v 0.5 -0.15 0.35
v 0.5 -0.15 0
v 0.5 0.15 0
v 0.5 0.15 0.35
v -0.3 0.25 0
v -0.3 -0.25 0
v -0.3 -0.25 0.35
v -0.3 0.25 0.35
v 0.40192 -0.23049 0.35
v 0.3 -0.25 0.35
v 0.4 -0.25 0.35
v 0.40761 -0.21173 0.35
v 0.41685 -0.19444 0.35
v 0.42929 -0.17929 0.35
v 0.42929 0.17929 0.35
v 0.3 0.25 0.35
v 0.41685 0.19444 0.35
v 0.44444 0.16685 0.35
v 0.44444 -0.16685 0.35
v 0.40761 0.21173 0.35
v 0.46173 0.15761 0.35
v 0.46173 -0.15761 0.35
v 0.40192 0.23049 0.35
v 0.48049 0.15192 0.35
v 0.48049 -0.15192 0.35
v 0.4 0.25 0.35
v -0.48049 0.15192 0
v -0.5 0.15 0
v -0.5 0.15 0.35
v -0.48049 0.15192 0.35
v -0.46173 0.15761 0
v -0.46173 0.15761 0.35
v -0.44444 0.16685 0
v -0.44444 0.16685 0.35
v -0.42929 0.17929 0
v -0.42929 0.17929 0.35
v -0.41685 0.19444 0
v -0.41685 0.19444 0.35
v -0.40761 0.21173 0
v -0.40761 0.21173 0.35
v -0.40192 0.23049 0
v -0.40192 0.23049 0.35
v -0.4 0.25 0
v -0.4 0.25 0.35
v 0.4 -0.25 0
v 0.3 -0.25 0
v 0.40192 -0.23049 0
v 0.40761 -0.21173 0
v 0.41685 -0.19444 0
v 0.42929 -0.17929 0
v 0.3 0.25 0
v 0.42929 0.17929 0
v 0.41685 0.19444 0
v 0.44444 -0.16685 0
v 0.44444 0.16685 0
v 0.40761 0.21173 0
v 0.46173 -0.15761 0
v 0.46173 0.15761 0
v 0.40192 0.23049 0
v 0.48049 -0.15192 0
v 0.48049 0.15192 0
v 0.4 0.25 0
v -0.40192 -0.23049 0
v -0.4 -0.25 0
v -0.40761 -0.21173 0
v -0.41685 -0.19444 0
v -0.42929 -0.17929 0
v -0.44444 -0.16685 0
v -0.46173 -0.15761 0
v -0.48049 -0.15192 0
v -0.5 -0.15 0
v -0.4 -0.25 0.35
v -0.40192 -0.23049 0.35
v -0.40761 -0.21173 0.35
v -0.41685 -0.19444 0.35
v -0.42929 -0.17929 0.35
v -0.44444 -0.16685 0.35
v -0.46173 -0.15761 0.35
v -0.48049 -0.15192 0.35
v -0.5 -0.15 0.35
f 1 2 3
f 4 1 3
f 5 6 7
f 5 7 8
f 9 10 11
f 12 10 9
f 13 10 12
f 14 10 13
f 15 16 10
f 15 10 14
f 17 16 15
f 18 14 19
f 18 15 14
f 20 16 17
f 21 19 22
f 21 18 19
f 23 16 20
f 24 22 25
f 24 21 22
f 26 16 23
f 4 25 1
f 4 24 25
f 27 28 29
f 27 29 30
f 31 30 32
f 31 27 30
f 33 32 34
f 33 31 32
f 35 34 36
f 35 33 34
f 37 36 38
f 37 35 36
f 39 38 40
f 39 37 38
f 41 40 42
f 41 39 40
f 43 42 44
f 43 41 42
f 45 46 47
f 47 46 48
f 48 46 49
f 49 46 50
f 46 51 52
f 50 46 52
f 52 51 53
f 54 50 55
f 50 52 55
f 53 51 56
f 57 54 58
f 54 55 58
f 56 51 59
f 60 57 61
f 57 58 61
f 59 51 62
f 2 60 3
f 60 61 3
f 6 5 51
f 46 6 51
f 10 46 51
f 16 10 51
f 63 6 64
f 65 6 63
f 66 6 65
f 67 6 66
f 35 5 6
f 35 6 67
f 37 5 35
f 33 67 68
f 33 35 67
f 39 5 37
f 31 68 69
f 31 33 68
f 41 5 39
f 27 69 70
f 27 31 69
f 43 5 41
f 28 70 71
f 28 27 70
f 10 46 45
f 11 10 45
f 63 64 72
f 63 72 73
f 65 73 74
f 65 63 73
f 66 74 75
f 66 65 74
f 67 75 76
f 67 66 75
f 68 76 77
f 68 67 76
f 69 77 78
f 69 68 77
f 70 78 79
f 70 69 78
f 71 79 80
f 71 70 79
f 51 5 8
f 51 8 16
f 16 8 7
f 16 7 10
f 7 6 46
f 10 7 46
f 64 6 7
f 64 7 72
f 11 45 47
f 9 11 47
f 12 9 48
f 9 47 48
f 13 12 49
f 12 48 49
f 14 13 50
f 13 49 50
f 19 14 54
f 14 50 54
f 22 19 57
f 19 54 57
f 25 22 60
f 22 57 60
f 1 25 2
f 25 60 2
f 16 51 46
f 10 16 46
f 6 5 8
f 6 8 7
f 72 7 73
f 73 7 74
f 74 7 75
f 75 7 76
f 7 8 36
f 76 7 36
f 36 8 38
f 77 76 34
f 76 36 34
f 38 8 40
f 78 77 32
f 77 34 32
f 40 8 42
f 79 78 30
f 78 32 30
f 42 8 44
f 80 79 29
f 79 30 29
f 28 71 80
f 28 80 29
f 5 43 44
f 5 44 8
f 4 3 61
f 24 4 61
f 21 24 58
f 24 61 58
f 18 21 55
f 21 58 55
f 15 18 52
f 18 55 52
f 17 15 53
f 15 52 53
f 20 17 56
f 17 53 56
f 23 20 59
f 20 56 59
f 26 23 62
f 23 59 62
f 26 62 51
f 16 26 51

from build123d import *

# Parameters (mm, degrees)
SKETCH1_W             = 0.6
SKETCH1_H             = 0.5
BOSS_EXTRUDE1_DEPTH   = 0.35
BOSS_EXTRUDE2_DEPTH   = 0.35
BOSS_EXTRUDE2_2_DEPTH = 0.35


with BuildPart() as part:
    # Sketch1 → Boss-Extrude1 (new body)
    with BuildSketch(Plane.XY):
        Rectangle(SKETCH1_W, SKETCH1_H)
    extrude(amount=BOSS_EXTRUDE1_DEPTH)


with BuildPart() as body_2:
    # Sketch2 → Boss-Extrude2 (new body)
    with BuildSketch(Plane.XY):
        with BuildLine():
            Line((-0.3, -0.25), (-0.4, -0.25))
            ThreePointArc((-0.4, -0.25), (-0.429289322, -0.179289322), (-0.5, -0.15))
            Line((-0.5, -0.15), (-0.5, 0.15))
            ThreePointArc((-0.5, 0.15), (-0.429289322, 0.179289322), (-0.4, 0.25))
            Line((-0.4, 0.25), (-0.3, 0.25))
            Line((-0.3, 0.25), (-0.3, -0.25))
        make_face()
    extrude(amount=BOSS_EXTRUDE2_DEPTH)


with BuildPart() as body_3:
    # Sketch2 → Boss-Extrude2 2 (new body)
    with BuildSketch(Plane.XY):
        with BuildLine():
            Line((0.3, 0.25), (0.3, -0.25))
            Line((0.3, -0.25), (0.4, -0.25))
            ThreePointArc((0.4, -0.25), (0.429289322, -0.179289322), (0.5, -0.15))
            Line((0.5, -0.15), (0.5, 0.15))
            ThreePointArc((0.5, 0.15), (0.429289322, 0.179289322), (0.4, 0.25))
            Line((0.4, 0.25), (0.3, 0.25))
        make_face()
    extrude(amount=BOSS_EXTRUDE2_2_DEPTH)


solid = Compound([part.part, body_2.part, body_3.part])
